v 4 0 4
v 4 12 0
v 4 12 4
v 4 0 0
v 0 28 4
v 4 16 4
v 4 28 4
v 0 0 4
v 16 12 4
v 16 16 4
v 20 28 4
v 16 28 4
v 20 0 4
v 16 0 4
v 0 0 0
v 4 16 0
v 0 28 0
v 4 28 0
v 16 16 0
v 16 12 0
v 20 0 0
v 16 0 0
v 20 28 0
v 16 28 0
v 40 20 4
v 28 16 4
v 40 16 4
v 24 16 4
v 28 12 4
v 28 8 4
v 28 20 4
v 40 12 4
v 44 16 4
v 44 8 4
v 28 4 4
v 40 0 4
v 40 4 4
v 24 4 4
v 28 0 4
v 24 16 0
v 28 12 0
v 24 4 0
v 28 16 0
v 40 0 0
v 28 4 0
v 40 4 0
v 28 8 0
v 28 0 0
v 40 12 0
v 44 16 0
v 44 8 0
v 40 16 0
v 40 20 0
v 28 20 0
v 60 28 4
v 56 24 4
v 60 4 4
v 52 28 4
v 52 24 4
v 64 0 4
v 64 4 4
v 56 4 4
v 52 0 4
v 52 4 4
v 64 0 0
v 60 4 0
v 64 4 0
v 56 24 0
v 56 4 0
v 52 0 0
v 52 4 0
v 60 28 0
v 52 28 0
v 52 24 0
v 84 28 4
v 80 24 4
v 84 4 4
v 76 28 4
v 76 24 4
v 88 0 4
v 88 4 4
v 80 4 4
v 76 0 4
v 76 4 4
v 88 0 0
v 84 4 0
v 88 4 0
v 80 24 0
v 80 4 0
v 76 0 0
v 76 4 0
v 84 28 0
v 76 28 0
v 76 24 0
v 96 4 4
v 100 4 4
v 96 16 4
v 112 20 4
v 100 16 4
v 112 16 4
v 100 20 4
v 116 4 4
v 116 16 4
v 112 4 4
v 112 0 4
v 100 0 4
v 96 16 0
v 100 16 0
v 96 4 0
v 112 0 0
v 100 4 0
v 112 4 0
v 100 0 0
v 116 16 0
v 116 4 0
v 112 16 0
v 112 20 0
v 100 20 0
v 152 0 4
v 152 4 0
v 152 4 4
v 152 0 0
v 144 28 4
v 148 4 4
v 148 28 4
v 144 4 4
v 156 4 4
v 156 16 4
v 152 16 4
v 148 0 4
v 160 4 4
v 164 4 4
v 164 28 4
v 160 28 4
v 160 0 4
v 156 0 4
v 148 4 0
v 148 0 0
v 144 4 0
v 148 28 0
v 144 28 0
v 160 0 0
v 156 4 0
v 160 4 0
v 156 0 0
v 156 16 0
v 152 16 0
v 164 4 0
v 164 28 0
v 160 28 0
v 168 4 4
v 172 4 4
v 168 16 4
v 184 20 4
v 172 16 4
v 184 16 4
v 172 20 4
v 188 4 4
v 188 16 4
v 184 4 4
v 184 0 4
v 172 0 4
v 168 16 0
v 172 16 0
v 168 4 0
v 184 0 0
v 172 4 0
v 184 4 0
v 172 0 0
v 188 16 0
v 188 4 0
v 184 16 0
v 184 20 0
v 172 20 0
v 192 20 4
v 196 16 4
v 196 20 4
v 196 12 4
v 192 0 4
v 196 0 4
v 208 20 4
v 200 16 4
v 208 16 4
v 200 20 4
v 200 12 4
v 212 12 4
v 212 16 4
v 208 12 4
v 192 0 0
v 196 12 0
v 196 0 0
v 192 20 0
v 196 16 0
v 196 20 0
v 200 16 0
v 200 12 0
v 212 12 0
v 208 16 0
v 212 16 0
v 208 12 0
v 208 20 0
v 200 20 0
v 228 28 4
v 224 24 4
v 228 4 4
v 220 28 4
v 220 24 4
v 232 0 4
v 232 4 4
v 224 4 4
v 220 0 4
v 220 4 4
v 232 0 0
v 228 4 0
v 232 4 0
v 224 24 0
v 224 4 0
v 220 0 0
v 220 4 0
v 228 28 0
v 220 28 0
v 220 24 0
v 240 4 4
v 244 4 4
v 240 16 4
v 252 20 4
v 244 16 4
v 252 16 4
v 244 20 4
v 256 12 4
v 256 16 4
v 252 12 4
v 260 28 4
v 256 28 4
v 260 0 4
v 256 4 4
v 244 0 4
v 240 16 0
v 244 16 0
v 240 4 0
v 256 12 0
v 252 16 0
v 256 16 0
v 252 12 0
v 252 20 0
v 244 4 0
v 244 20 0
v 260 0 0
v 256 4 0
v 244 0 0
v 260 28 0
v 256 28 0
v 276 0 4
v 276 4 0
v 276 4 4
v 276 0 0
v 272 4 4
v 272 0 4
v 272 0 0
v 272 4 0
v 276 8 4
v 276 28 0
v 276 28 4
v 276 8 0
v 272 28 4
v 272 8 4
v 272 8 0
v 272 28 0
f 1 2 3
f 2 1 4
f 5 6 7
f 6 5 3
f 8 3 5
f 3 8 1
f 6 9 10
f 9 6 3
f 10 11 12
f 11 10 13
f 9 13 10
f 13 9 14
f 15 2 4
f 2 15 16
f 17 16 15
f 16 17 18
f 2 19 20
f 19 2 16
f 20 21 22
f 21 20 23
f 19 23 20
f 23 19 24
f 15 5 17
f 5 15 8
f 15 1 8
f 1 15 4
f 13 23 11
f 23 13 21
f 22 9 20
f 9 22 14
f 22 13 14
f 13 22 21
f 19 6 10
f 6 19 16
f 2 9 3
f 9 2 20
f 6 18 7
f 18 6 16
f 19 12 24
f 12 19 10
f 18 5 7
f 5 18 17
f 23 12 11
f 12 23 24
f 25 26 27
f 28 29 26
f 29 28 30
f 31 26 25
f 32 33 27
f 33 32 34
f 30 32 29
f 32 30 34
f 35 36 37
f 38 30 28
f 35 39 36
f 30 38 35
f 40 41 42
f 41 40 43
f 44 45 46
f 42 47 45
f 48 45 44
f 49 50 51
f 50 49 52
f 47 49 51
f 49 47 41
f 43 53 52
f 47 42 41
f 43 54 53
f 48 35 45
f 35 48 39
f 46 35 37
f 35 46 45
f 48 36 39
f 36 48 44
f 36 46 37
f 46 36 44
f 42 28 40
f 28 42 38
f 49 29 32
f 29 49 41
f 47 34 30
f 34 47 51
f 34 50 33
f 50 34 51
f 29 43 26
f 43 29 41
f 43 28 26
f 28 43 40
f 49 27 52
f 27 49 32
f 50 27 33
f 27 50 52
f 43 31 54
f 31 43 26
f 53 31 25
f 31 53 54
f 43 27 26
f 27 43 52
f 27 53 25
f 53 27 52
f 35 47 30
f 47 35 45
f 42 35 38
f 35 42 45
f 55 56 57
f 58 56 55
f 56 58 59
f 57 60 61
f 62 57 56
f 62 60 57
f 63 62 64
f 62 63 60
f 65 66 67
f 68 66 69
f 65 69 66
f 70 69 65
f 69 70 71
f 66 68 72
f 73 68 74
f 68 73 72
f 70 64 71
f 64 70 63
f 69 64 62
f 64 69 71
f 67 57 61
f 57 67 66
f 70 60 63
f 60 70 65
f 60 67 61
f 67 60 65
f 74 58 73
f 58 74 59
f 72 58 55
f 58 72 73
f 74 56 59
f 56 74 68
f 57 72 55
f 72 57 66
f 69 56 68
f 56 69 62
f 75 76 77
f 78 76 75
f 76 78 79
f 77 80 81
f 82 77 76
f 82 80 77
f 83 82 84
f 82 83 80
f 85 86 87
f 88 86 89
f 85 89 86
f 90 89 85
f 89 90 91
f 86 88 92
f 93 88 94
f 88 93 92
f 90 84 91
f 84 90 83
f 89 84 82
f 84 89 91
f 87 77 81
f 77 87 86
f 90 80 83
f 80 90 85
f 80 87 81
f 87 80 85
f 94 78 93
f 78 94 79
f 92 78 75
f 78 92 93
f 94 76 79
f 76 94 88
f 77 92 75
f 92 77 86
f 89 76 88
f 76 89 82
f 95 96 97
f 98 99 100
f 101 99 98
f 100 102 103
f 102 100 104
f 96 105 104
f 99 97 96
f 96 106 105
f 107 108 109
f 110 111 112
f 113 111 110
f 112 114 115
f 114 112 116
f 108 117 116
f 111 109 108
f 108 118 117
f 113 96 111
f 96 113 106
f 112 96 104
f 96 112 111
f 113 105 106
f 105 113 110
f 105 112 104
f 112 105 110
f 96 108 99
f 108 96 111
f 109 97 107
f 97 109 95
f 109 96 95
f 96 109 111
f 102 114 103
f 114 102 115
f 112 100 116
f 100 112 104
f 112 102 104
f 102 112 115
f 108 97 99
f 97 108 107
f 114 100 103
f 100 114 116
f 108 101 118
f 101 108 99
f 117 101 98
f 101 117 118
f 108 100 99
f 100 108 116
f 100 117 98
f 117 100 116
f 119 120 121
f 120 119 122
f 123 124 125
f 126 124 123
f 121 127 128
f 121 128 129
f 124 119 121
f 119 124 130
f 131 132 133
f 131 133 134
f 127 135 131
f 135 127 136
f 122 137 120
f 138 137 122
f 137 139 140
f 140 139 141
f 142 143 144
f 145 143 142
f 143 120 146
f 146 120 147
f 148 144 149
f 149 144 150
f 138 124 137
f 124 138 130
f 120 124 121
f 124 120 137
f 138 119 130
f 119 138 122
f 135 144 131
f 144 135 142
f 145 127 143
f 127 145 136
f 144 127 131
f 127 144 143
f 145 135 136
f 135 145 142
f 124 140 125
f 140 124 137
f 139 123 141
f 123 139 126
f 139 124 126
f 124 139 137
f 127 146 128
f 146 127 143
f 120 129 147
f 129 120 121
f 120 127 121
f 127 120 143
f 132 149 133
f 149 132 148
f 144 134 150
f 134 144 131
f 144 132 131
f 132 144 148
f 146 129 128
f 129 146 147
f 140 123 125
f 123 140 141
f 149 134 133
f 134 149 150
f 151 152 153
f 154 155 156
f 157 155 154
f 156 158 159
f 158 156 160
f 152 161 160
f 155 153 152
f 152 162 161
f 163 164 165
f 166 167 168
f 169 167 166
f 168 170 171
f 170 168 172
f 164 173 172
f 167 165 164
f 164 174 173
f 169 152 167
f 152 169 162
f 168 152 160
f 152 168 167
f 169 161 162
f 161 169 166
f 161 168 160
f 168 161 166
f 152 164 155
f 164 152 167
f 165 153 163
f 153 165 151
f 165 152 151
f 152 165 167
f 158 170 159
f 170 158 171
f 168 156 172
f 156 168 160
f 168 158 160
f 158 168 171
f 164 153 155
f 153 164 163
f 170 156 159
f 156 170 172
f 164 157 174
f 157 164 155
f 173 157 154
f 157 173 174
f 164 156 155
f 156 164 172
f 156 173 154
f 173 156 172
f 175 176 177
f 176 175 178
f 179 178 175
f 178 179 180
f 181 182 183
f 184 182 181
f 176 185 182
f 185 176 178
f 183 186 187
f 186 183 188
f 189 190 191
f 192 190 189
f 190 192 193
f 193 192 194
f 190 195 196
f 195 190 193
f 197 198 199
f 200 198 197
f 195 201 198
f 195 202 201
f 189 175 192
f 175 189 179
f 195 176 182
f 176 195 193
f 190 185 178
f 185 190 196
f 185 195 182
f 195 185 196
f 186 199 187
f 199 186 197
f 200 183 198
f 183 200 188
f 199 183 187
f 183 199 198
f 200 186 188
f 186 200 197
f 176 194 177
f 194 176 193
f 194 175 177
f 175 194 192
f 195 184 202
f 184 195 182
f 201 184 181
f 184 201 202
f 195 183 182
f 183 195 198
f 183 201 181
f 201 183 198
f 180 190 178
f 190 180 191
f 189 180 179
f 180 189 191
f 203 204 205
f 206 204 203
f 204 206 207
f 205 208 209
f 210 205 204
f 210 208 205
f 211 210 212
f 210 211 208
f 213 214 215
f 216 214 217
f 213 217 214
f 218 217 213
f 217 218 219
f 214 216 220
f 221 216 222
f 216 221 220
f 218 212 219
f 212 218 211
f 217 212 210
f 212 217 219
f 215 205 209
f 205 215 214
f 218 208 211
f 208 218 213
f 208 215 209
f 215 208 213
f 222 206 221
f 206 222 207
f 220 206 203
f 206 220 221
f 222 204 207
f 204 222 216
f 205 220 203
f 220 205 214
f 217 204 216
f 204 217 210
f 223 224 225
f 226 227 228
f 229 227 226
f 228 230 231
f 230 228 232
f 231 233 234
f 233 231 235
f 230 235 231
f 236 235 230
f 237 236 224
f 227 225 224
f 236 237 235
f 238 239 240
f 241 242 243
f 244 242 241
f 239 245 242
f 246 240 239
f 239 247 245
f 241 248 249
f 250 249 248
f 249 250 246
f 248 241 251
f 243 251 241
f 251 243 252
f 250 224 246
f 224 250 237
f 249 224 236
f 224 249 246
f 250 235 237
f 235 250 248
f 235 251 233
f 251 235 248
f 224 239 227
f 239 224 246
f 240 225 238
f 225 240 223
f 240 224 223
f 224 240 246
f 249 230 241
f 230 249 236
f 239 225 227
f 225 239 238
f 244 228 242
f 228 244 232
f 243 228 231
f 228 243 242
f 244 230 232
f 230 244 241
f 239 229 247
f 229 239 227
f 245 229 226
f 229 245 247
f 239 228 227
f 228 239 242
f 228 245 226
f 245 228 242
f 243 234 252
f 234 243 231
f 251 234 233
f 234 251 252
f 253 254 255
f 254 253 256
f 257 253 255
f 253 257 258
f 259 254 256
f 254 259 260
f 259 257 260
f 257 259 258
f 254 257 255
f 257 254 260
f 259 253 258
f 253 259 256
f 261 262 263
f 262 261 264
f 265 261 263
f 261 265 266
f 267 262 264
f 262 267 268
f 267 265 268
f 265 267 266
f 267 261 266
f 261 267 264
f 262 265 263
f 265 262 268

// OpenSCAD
//Draw text
scale([4,4,4]) drawtext("Hello World!");

//Draw character set
//scale([2,2,2]) drawtext(" !\"#$%&'()*+,-./0123456789:;<=>?@ABCDEFGHIJKLMNOPQRSTUVWXYZ[\\]^_`abcdefghijklmnopqrstuvwxyz{|}");

module drawtext(text) {
	//Characters
	chars = " !\"#$%&'()*+,-./0123456789:;<=>?@ABCDEFGHIJKLMNOPQRSTUVWXYZ[\\]^_`abcdefghijklmnopqrstuvwxyz{|}";

	//Chracter table defining 5x7 characters
	//Adapted from: http://www.geocities.com/dinceraydin/djlcdsim/chartable.js
	char_table = [ [ 0, 0, 0, 0, 0, 0, 0],
                  [ 4, 0, 4, 4, 4, 4, 4],
                  [ 0, 0, 0, 0,10,10,10],
                  [10,10,31,10,31,10,10],
                  [ 4,30, 5,14,20,15, 4],
                  [ 3,19, 8, 4, 2,25,24],
                  [13,18,21, 8,20,18,12],
                  [ 0, 0, 0, 0, 8, 4,12],
                  [ 2, 4, 8, 8, 8, 4, 2],
                  [ 8, 4, 2, 2, 2, 4, 8],
                  [ 0, 4,21,14,21, 4, 0],
                  [ 0, 4, 4,31, 4, 4, 0],
                  [ 8, 4,12, 0, 0, 0, 0],
                  [ 0, 0, 0,31, 0, 0, 0],
                  [12,12, 0, 0, 0, 0, 0],
                  [ 0,16, 8, 4, 2, 1, 0],
                  [14,17,25,21,19,17,14],
                  [14, 4, 4, 4, 4,12, 4],
                  [31, 8, 4, 2, 1,17,14],
                  [14,17, 1, 2, 4, 2,31],
                  [ 2, 2,31,18,10, 6, 2],
                  [14,17, 1, 1,30,16,31],
                  [14,17,17,30,16, 8, 6],
                  [ 8, 8, 8, 4, 2, 1,31],
                  [14,17,17,14,17,17,14],
                  [12, 2, 1,15,17,17,14],
                  [ 0,12,12, 0,12,12, 0],
                  [ 8, 4,12, 0,12,12, 0],
                  [ 2, 4, 8,16, 8, 4, 2],
                  [ 0, 0,31, 0,31, 0, 0],
                  [16, 8, 4, 2, 4, 8,16],
                  [ 4, 0, 4, 2, 1,17,14],
                  [14,21,21,13, 1,17,14],
                  [17,17,31,17,17,17,14],
                  [30,17,17,30,17,17,30],
                  [14,17,16,16,16,17,14],
                  [30,17,17,17,17,17,30],
                  [31,16,16,30,16,16,31],
                  [16,16,16,30,16,16,31],
                  [15,17,17,23,16,17,14],
                  [17,17,17,31,17,17,17],
                  [14, 4, 4, 4, 4, 4,14],
                  [12,18, 2, 2, 2, 2, 7],
                  [17,18,20,24,20,18,17],
                  [31,16,16,16,16,16,16],
                  [17,17,17,21,21,27,17],
                  [17,17,19,21,25,17,17],
                  [14,17,17,17,17,17,14],
                  [16,16,16,30,17,17,30],
                  [13,18,21,17,17,17,14],
                  [17,18,20,30,17,17,30],
                  [30, 1, 1,14,16,16,15],
                  [ 4, 4, 4, 4, 4, 4,31],
                  [14,17,17,17,17,17,17],
                  [ 4,10,17,17,17,17,17],
                  [10,21,21,21,17,17,17],
                  [17,17,10, 4,10,17,17],
                  [ 4, 4, 4,10,17,17,17],
                  [31,16, 8, 4, 2, 1,31],
                  [14, 8, 8, 8, 8, 8,14],
                  [ 0, 1, 2, 4, 8,16, 0],
                  [14, 2, 2, 2, 2, 2,14],
                  [ 0, 0, 0, 0,17,10, 4],
                  [31, 0, 0, 0, 0, 0, 0],
                  [ 0, 0, 0, 0, 2, 4, 8],
                  [15,17,15, 1,14, 0, 0],
                  [30,17,17,25,22,16,16],
                  [14,17,16,16,14, 0, 0],
                  [15,17,17,19,13, 1, 1],
                  [14,16,31,17,14, 0, 0],
                  [ 8, 8, 8,28, 8, 9, 6],
                  [14, 1,15,17,15, 0, 0],
                  [17,17,17,25,22,16,16],
                  [14, 4, 4, 4,12, 0, 4],
                  [12,18, 2, 2, 2, 6, 2],
                  [18,20,24,20,18,16,16],
                  [14, 4, 4, 4, 4, 4,12],
                  [17,17,21,21,26, 0, 0],
                  [17,17,17,25,22, 0, 0],
                  [14,17,17,17,14, 0, 0],
                  [16,16,30,17,30, 0, 0],
                  [ 1, 1,15,19,13, 0, 0],
                  [16,16,16,25,22, 0, 0],
                  [30, 1,14,16,15, 0, 0],
                  [ 6, 9, 8, 8,28, 8, 8],
                  [13,19,17,17,17, 0, 0],
                  [ 4,10,17,17,17, 0, 0],
                  [10,21,21,17,17, 0, 0],
                  [17,10, 4,10,17, 0, 0],
                  [14, 1,15,17,17, 0, 0],
                  [31, 8, 4, 2,31, 0, 0],
                  [ 2, 4, 4, 8, 4, 4, 2],
                  [ 4, 4, 4, 4, 4, 4, 4],
                  [ 8, 4, 4, 2, 4, 4, 8] ];

	//Binary decode table
	dec_table = [ "00000", "00001", "00010", "00011", "00100", "00101",
  	            "00110", "00111", "01000", "01001", "01010", "01011",
  	            "01100", "01101", "01110", "01111", "10000", "10001",
  	            "10010", "10011", "10100", "10101", "10110", "10111",
	            "11000", "11001", "11010", "11011", "11100", "11101",
	            "11110", "11111" ];

	//Process string one character at a time
	for(itext = [0:len(text)-1]) {
		//Convert character to index
		ichar = search(text[itext],chars,1)[0];

        //Decode character - rows
        for(irow = [0:6]) {
            //Select value to draw from table
            val = dec_table[char_table[ichar][irow]];

            //Decode character - cols
            for(icol = [0:4]) {
                // Retrieve bit to draw
                bit = search(val[icol],"01",1)[0];

                if(bit) {
                    //Output cube
                    translate([icol + (6*itext), irow, 0])
                        cube([1.0001,1.0001,1]);
                }
            }
        }
	}
}
